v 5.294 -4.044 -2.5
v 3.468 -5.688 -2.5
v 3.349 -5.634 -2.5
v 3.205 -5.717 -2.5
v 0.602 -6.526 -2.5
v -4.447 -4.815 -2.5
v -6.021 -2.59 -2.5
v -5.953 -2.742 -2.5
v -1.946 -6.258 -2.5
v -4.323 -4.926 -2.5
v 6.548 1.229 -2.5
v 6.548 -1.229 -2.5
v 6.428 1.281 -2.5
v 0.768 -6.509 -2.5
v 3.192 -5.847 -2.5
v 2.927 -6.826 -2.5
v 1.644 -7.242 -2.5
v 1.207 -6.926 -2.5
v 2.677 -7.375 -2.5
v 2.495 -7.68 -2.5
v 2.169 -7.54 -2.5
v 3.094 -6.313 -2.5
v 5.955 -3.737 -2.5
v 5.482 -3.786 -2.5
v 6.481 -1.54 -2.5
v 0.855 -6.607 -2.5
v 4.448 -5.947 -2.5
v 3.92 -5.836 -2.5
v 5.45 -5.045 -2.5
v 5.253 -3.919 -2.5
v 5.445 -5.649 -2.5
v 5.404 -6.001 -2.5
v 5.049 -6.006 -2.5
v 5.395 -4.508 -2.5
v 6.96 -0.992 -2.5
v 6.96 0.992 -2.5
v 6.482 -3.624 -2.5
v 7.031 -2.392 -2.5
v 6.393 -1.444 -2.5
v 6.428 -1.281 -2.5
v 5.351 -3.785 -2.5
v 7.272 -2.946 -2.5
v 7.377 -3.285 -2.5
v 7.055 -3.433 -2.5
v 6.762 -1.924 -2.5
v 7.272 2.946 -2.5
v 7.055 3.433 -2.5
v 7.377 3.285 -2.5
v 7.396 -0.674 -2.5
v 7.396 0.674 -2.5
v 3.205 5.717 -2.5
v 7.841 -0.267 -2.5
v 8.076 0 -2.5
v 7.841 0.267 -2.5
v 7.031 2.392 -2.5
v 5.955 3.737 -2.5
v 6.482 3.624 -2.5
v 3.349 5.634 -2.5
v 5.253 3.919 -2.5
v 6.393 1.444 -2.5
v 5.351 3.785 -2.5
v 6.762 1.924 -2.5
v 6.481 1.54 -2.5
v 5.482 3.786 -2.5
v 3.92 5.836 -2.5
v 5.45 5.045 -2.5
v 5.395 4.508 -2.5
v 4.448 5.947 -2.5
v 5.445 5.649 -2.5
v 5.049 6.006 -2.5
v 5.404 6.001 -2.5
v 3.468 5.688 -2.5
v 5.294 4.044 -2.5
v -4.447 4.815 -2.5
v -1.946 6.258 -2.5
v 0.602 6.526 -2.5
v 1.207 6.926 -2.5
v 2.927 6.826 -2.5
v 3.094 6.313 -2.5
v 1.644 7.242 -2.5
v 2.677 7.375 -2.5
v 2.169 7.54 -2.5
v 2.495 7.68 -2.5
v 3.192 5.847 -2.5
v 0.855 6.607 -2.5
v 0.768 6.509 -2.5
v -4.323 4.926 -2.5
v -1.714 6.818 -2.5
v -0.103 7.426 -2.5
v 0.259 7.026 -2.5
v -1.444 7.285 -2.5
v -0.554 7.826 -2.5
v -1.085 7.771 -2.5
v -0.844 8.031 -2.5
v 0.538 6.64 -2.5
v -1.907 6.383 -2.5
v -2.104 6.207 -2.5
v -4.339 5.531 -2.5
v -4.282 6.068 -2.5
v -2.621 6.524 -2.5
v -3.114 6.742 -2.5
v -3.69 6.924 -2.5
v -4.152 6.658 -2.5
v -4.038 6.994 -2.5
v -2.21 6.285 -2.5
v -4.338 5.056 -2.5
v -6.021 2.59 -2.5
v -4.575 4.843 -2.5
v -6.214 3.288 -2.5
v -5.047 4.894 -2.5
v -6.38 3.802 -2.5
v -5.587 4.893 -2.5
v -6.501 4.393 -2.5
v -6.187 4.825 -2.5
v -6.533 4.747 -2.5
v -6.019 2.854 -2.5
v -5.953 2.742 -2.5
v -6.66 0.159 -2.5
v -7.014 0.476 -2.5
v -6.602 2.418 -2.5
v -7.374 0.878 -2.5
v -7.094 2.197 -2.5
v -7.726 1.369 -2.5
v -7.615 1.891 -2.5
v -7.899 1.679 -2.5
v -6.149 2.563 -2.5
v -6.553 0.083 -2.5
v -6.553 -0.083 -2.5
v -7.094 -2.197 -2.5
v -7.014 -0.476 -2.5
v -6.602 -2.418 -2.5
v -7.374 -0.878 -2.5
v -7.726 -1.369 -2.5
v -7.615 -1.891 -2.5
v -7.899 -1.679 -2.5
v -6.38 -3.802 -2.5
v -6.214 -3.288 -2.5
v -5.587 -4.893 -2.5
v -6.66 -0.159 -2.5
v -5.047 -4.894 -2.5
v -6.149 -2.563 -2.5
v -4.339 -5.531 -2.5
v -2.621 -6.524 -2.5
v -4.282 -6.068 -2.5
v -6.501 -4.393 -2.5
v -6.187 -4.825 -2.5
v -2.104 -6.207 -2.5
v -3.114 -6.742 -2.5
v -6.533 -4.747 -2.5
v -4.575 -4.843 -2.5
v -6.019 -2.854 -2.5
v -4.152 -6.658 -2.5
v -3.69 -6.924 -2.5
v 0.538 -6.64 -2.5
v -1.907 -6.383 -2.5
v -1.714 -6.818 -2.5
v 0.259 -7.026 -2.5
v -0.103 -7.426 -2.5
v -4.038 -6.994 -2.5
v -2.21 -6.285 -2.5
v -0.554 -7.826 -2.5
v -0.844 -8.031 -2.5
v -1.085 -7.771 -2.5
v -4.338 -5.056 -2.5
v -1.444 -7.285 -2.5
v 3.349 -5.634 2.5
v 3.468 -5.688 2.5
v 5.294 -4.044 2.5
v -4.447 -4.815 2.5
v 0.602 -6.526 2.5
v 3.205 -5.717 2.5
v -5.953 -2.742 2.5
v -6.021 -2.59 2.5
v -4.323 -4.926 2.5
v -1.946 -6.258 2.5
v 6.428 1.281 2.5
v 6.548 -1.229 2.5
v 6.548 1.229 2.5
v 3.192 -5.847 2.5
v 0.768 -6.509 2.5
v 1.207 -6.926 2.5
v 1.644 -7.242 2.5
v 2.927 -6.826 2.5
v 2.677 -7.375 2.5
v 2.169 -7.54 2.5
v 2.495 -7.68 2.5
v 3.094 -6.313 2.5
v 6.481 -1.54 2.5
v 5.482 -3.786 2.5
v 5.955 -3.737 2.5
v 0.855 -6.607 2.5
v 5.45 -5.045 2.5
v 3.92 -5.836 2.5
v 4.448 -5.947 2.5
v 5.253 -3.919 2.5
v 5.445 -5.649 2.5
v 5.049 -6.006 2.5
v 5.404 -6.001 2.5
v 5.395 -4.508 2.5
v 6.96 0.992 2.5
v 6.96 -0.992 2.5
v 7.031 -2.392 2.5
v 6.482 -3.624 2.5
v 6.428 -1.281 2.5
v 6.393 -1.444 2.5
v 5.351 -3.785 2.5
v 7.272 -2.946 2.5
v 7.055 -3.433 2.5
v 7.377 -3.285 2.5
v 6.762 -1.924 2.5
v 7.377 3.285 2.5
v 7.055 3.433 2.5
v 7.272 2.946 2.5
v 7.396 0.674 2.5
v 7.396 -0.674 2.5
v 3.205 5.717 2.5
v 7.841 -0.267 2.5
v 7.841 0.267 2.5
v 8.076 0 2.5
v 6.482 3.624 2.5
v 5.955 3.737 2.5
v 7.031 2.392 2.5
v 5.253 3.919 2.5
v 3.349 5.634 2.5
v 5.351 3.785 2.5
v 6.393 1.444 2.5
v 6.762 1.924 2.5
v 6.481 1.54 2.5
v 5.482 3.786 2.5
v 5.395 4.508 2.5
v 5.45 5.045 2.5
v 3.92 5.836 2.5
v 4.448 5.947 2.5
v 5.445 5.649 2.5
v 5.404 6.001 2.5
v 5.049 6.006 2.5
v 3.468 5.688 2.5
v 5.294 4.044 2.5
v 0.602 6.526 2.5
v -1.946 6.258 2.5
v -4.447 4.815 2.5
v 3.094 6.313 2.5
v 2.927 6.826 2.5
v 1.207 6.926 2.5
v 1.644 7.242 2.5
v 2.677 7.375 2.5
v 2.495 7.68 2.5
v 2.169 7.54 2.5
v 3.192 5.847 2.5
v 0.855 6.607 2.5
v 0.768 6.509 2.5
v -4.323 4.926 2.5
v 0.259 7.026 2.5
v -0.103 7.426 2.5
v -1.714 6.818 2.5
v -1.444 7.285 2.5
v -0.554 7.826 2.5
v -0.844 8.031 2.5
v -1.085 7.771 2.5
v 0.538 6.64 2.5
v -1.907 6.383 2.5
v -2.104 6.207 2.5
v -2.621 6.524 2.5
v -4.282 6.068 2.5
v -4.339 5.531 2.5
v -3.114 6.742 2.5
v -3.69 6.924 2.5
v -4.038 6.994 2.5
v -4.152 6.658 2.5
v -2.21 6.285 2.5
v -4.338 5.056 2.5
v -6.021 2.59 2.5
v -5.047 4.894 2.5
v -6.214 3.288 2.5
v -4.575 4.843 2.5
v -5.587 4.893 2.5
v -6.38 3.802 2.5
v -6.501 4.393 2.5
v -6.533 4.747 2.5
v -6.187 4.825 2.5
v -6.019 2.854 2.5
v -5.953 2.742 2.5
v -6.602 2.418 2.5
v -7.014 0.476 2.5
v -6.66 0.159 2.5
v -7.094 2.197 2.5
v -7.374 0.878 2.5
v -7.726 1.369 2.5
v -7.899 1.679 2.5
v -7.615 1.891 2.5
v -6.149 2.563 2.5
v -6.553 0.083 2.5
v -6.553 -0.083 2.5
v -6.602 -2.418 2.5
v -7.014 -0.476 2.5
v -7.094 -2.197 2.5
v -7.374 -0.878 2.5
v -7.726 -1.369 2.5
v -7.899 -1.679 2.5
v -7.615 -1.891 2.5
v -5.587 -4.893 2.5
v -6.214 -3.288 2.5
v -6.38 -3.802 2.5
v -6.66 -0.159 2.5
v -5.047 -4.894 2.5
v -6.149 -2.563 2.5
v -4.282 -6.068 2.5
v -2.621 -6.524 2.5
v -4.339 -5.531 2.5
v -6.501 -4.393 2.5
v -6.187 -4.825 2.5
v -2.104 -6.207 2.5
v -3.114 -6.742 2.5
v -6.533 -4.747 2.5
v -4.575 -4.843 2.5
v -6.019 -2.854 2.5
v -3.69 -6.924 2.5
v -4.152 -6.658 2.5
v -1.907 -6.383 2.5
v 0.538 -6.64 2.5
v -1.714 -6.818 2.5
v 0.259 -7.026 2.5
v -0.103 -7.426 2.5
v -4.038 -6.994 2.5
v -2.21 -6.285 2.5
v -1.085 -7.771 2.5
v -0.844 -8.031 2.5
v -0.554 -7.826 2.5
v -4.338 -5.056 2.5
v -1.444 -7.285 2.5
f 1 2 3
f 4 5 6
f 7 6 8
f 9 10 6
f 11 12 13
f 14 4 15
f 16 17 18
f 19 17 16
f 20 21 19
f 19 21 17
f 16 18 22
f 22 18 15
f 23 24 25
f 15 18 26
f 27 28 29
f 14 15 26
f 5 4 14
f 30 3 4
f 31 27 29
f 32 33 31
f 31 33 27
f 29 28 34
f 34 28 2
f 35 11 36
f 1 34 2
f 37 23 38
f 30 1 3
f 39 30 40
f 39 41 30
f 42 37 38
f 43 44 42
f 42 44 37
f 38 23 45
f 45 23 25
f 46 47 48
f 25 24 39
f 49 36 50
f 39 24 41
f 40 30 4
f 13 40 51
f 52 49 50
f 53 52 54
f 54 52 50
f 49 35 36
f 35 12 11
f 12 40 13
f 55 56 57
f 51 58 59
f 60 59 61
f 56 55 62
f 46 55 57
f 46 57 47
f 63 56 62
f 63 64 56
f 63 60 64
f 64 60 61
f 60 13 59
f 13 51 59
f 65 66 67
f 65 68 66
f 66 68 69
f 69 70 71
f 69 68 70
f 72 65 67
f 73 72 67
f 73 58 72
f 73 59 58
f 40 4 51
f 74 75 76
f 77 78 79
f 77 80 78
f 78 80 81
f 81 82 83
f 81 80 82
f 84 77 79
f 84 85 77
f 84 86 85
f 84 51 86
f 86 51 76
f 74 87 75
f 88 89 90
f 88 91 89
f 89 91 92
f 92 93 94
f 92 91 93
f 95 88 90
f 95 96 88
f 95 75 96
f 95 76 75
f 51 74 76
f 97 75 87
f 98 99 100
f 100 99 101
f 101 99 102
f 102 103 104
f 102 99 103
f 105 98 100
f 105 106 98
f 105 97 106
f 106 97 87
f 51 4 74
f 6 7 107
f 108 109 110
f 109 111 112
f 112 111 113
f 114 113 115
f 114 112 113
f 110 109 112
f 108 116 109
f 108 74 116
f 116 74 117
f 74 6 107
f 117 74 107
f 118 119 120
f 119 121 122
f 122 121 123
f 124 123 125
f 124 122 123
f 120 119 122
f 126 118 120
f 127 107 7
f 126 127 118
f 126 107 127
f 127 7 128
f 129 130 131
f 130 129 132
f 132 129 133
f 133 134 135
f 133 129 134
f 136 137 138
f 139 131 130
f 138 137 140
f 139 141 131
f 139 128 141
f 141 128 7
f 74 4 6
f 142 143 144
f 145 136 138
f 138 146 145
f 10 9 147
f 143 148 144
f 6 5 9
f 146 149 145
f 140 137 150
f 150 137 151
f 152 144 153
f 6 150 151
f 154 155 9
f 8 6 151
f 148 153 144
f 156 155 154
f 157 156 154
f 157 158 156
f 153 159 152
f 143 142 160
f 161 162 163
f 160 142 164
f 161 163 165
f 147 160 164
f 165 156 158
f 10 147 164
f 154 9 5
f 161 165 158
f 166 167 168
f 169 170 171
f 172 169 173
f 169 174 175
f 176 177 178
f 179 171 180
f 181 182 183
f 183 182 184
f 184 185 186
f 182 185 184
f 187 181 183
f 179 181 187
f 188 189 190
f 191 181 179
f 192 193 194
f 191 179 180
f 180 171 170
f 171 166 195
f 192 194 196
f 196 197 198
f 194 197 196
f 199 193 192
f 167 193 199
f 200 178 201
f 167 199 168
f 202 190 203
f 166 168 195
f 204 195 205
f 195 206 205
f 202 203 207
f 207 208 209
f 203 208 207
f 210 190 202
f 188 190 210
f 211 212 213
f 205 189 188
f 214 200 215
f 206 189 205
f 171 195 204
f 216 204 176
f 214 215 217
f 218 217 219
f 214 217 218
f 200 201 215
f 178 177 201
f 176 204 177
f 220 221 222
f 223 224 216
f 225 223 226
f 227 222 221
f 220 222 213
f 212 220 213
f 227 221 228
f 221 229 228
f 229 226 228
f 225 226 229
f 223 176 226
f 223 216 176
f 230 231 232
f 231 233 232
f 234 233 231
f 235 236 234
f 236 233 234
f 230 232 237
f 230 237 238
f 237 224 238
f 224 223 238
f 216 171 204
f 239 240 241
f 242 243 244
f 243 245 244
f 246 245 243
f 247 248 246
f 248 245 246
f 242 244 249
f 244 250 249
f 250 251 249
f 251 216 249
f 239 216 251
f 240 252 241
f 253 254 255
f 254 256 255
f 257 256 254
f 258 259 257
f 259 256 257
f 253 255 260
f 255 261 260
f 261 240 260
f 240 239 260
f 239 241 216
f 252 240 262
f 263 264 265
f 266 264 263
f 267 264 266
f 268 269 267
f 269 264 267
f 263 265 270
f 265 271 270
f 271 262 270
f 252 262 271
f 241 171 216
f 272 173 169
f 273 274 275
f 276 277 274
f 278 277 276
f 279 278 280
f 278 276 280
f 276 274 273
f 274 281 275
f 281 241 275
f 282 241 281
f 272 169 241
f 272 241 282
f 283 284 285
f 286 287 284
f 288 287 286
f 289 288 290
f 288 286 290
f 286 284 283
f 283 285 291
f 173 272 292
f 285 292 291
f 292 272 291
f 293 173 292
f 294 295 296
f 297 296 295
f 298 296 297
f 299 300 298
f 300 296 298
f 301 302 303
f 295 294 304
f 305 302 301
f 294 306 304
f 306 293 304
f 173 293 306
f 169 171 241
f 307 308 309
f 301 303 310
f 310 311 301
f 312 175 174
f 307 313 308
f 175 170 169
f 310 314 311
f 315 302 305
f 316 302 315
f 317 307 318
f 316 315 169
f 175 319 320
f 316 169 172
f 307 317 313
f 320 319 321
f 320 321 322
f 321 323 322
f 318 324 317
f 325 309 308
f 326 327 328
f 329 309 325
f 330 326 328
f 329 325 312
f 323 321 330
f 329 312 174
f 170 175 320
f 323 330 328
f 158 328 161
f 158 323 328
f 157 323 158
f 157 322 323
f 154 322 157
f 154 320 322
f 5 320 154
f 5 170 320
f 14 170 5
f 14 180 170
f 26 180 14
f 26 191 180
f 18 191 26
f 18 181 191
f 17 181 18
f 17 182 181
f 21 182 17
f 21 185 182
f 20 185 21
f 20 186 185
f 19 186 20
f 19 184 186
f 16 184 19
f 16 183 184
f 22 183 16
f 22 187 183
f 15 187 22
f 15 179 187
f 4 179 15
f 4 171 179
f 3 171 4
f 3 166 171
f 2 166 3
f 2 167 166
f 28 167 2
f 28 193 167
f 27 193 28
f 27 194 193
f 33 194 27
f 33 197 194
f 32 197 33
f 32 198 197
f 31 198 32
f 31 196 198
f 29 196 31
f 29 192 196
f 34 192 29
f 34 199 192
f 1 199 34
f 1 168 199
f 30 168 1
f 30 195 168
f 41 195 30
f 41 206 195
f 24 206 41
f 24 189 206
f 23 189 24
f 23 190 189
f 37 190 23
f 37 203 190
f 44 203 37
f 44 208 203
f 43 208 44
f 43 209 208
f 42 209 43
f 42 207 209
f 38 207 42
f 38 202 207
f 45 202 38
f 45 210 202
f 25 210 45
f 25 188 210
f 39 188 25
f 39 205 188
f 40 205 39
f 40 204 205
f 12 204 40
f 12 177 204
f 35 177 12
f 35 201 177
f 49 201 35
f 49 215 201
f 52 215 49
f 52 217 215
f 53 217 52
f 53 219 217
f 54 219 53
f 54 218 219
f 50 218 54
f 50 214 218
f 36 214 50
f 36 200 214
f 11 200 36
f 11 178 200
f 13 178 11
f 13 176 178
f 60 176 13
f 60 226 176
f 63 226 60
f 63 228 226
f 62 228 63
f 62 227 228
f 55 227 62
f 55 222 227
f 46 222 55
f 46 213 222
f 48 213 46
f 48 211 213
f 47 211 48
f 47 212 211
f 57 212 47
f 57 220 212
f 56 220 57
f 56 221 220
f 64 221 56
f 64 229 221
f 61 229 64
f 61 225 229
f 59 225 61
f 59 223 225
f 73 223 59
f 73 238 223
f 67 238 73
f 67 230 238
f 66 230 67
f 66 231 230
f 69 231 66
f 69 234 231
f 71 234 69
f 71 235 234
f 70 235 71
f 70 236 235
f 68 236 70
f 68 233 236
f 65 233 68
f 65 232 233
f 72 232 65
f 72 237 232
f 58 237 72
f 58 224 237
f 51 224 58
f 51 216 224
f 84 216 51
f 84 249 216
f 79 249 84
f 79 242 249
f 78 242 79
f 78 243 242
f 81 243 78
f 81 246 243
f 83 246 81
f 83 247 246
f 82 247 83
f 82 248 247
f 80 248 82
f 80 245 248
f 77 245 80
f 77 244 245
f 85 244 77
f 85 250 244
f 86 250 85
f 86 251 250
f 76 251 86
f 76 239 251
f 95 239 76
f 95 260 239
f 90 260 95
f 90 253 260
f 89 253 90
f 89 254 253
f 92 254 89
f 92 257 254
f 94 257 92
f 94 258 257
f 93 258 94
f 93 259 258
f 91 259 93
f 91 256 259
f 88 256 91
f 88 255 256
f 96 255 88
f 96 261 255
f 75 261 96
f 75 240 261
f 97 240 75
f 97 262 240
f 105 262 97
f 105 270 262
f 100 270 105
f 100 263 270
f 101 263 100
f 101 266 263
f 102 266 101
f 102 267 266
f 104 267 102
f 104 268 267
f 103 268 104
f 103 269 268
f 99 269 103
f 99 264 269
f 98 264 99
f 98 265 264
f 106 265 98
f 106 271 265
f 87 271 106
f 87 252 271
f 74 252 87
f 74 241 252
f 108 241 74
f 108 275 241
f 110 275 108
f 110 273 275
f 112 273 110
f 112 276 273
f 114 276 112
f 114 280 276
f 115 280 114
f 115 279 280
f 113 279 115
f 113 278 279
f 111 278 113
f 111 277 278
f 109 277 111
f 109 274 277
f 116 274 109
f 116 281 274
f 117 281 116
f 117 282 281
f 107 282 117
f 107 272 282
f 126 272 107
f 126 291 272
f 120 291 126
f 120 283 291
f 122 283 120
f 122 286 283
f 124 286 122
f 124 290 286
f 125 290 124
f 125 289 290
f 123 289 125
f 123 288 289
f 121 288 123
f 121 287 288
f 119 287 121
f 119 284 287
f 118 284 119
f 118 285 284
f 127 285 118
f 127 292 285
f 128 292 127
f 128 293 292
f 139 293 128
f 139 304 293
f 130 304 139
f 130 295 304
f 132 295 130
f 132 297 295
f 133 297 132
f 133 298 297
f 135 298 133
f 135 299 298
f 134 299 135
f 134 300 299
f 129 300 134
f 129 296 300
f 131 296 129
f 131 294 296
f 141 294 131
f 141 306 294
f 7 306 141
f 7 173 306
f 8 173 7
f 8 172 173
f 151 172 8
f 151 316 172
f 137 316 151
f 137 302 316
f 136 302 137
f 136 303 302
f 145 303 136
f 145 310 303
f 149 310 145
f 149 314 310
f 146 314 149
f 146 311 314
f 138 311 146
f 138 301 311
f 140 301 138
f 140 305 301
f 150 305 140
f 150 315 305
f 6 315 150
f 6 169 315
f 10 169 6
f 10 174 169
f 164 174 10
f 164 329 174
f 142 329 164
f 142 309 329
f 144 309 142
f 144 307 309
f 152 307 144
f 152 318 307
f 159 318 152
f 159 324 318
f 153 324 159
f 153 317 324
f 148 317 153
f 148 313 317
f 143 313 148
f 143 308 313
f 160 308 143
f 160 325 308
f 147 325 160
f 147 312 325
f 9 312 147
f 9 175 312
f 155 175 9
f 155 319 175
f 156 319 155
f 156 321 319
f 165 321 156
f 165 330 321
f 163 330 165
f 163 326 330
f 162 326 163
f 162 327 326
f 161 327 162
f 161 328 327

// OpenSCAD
//
//  pocket_extruder
//
//  Copyright 2014 by Ron Aldrich.
//
//  License: CC-By-SA - http://creativecommons.org/licenses/by-sa/3.0/deed.en_US
//

gear(
	number_of_teeth=15,
 	modulus=1,
	pressure_angle=45,
	depth_ratio=.5,
	clearance=.25,
	h=5,
	center=true);

function gear_outer_radius(number_of_teeth,
	modulus,
	depth_ratio,
	clearance) = (number_of_teeth*modulus/2)+depth_ratio*(modulus*PI)/2-clearance/2;

function gear_pitch_radius(number_of_teeth, modulus) = number_of_teeth*modulus/2;

module gear (
	number_of_teeth,
	modulus,
	pressure_angle,
	depth_ratio,
	clearance,
	h,
	center=false)
{
	linear_extrude(height=h, center=center, convexity=4)
	{
		gear2D(number_of_teeth, modulus, pressure_angle, depth_ratio, clearance);
	}
}

module gear2D (
	number_of_teeth,
	modulus,
	pressure_angle,
	depth_ratio,
	clearance)
{
	circular_pitch = modulus*PI;
	pitch_radius = gear_pitch_radius(number_of_teeth, modulus);
	base_radius = pitch_radius*cos(pressure_angle);
	depth=circular_pitch/(2*tan(pressure_angle));
	outer_radius = clearance<0 ? pitch_radius+depth/2-clearance : pitch_radius+depth/2;
	root_radius1 = pitch_radius-depth/2-clearance/2;
	root_radius = (clearance<0 && root_radius1<base_radius) ? base_radius : root_radius1;
	backlash_angle = clearance/(pitch_radius*cos(pressure_angle)) * 180 / PI;
	half_thick_angle = 90/number_of_teeth - backlash_angle/2;
	pitch_point = involute (base_radius, involute_intersect_angle (base_radius, pitch_radius));
	pitch_angle = atan2 (pitch_point[1], pitch_point[0]);
	min_radius = max (base_radius,root_radius);

	*echo("circular_pitch = ", circular_pitch,
		"pitch_radius = ", pitch_radius,
		"base_radius = ", base_radius,
		"depth = ", depth,
		"outer_radius = ", outer_radius);

	intersection()
	{
		rotate(90/number_of_teeth)
			circle($fn=number_of_teeth*3,r=pitch_radius+depth_ratio*circular_pitch/2-clearance/2);
		union()
		{
			rotate(90/number_of_teeth)
				circle($fn=number_of_teeth*2,r=max(root_radius,pitch_radius-depth_ratio*circular_pitch/2-clearance/2));
			for (i = [1:number_of_teeth])rotate(i*360/number_of_teeth)
			{
				halftooth (
					pitch_angle,
					base_radius,
					min_radius,
					outer_radius,
					half_thick_angle);		
				mirror([0,1]) halftooth (
					pitch_angle,
					base_radius,
					min_radius,
					outer_radius,
					half_thick_angle);
			}
		}
	}
}

module halftooth (
	pitch_angle,
	base_radius,
	min_radius,
	outer_radius,
	half_thick_angle)
{
	index=[0,1,2,3,4,5];
	start_angle = max(involute_intersect_angle (base_radius, min_radius)-5,0);
	stop_angle = involute_intersect_angle (base_radius, outer_radius);
	angle=index*(stop_angle-start_angle)/index[len(index)-1];
	p=[[0,0],
	involute(base_radius,angle[0]+start_angle),
	involute(base_radius,angle[1]+start_angle),
	involute(base_radius,angle[2]+start_angle),
	involute(base_radius,angle[3]+start_angle),
	involute(base_radius,angle[4]+start_angle),
	involute(base_radius,angle[5]+start_angle)];

	difference()	
	{
		rotate(-pitch_angle-half_thick_angle)polygon(points=p);
		square(2*outer_radius);
	}
}

// Mathematical Functions
//===============

// Finds the angle of the involute about the base radius at the given distance (radius) from it's center.
//source: http://www.mathhelpforum.com/math-help/geometry/136011-circle-involute-solving-y-any-given-x.html

function involute_intersect_angle (base_radius, radius) = sqrt (pow (radius/base_radius, 2) - 1) * 180 / PI;

// Calculate the involute position for a given base radius and involute angle.

function involute (base_radius, involute_angle) =
[
	base_radius*(cos (involute_angle) + involute_angle*PI/180*sin (involute_angle)),
	base_radius*(sin (involute_angle) - involute_angle*PI/180*cos (involute_angle))
];
